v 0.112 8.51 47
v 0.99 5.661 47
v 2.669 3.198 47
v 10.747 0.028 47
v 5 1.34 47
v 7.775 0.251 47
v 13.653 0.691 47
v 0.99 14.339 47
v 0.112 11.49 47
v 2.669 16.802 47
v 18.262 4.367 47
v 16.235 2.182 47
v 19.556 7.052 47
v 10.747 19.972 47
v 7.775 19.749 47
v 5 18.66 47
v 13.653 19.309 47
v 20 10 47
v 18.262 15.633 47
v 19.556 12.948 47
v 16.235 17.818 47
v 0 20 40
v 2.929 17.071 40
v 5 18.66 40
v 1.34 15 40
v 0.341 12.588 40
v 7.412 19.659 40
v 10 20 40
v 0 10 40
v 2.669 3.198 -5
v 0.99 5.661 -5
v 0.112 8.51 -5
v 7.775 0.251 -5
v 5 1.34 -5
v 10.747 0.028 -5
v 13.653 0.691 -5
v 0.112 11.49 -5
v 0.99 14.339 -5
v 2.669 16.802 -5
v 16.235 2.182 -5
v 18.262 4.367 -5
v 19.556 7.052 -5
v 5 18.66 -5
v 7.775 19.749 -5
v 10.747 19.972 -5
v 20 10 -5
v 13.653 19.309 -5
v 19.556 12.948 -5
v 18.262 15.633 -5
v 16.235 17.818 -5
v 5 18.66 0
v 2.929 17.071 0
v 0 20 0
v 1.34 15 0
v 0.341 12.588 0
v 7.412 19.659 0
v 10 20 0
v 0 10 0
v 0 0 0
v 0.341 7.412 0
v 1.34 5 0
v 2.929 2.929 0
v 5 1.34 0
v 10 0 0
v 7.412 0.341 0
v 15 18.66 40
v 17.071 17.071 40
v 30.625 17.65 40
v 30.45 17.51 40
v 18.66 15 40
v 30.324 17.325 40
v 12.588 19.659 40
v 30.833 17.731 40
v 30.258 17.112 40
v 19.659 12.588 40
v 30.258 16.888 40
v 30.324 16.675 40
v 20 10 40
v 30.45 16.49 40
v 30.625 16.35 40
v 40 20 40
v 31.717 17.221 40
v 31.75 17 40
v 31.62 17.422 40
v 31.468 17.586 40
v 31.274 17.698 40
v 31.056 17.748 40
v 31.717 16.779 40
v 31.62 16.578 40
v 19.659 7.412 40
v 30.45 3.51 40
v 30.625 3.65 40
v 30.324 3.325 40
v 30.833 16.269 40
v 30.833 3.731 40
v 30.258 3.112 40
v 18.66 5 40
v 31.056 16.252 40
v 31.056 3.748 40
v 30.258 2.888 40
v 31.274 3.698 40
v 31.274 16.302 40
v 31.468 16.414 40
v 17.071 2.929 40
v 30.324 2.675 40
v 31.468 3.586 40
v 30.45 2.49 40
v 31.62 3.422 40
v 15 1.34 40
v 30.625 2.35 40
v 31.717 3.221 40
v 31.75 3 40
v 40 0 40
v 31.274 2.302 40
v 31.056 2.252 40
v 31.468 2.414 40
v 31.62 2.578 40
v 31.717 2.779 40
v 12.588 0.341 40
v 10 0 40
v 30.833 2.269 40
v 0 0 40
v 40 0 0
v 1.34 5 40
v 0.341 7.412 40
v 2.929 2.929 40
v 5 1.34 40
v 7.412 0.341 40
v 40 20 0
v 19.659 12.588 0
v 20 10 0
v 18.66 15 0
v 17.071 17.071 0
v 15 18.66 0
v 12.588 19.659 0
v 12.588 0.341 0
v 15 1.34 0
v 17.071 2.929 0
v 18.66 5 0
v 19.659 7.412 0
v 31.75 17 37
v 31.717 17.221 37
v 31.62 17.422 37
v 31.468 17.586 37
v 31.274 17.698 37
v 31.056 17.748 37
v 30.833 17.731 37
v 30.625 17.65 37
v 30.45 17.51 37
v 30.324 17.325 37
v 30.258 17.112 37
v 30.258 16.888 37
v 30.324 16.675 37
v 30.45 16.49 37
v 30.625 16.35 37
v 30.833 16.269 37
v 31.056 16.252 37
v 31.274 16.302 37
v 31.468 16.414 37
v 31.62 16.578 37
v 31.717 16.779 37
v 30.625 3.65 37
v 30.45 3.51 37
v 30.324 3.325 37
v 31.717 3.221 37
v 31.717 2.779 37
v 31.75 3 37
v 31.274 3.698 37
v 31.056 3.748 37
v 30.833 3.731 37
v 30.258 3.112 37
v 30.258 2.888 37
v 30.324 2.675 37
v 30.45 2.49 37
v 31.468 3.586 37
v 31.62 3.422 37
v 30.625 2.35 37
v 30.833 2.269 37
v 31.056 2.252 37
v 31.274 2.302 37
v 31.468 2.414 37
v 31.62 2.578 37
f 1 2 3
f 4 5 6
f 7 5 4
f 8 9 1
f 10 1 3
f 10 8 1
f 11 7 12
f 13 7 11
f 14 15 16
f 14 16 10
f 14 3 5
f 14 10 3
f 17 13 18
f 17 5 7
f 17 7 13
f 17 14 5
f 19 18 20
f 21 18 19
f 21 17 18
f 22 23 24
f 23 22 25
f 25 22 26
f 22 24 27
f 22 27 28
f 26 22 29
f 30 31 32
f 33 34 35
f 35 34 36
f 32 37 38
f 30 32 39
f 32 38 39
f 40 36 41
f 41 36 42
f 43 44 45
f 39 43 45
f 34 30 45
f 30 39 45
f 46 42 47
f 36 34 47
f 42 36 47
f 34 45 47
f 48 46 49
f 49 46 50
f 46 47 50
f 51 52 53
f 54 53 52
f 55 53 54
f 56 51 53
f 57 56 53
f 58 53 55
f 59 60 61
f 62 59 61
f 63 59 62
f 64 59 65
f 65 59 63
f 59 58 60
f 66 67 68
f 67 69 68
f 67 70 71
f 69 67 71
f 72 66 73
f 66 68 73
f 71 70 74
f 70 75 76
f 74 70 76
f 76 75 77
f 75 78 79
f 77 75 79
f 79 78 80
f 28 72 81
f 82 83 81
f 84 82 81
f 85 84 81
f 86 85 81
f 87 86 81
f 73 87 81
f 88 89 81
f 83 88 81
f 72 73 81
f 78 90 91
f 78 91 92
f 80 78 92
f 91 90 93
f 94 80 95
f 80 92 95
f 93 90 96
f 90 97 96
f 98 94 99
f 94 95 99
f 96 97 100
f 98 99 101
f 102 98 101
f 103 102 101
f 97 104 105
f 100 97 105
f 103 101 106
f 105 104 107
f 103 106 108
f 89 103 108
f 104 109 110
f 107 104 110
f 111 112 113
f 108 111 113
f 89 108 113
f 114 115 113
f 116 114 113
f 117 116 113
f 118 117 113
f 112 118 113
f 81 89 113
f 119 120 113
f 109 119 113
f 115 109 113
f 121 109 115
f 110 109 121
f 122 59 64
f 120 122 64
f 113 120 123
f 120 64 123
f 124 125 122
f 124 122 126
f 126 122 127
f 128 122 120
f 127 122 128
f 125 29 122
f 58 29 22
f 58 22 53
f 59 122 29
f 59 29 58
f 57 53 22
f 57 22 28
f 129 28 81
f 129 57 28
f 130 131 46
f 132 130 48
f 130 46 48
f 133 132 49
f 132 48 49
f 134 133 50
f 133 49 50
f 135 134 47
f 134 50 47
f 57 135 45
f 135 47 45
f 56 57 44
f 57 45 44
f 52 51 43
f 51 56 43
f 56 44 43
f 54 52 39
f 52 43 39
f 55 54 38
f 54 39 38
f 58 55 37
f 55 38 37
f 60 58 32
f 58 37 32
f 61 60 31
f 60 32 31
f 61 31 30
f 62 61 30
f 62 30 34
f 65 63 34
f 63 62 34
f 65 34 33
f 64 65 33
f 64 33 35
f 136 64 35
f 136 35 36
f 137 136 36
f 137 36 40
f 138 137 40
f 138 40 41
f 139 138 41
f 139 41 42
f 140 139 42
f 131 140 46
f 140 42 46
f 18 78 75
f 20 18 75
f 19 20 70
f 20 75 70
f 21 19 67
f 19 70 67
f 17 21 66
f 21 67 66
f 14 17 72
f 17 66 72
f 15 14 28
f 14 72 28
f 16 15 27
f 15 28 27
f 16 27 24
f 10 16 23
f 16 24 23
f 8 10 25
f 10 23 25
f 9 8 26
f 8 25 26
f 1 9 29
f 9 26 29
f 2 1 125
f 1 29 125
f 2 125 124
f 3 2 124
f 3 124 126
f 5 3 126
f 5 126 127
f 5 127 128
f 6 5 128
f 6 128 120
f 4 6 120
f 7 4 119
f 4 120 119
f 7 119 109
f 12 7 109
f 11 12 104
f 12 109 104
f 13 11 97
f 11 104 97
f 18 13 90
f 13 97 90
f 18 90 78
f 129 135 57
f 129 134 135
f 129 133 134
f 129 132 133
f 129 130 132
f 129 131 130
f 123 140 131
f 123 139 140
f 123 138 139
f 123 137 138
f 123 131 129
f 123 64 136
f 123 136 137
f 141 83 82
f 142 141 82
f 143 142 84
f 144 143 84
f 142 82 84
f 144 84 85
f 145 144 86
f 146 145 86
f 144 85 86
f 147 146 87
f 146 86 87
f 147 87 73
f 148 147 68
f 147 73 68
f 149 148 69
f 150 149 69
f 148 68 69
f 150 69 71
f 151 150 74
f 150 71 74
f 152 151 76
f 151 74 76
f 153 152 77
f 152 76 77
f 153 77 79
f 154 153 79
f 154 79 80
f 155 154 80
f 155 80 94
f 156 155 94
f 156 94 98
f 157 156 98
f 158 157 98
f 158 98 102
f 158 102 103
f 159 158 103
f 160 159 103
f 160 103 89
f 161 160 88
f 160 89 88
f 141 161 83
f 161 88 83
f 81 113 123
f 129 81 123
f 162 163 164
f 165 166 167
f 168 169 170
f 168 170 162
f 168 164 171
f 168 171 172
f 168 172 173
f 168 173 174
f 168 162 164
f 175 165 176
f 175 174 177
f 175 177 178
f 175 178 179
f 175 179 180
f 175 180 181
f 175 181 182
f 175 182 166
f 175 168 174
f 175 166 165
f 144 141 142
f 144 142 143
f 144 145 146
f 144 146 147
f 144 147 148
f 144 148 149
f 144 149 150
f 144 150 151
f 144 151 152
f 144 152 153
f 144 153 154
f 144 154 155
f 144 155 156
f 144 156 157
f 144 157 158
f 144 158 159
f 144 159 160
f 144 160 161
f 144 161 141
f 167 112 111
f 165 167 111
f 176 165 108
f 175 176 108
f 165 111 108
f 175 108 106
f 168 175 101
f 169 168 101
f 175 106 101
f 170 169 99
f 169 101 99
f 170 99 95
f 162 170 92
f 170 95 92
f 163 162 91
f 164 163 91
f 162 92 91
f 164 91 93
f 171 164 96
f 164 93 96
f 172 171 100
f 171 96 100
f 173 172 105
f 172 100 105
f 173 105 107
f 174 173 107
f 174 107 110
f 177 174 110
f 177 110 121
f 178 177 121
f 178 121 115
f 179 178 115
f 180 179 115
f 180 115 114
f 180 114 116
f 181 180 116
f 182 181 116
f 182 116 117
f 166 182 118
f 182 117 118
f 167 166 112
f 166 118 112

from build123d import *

# Parameters (mm, degrees)
SKETCH_1_W           = 40
SKETCH_1_H           = 40
EXTRUDE_1_DEPTH      = 20
EXTRUDE_2_DEPTH      = 7
EXTRUDE_2_DEPTH_BACK = 45
SKETCH_2_R           = 10
SKETCH_3_R           = 0.75
CUT_EXTRUDE_1_DEPTH  = 3


with BuildPart() as part:
    # 草图1 → 凸台-拉伸1 (new body)
    with BuildSketch(Plane(origin=(0, 0, 0), x_dir=(1, 0, 0), z_dir=(0, 1, 0))):
        with Locations((20, -20)):
            Rectangle(SKETCH_1_W, SKETCH_1_H)
    extrude(amount=EXTRUDE_1_DEPTH)

    # 草图2 → 凸台-拉伸2 (add, two sides: drawn at the far end of the back side and taken through both)
    with BuildSketch(Plane.XY.offset(40).offset(-EXTRUDE_2_DEPTH_BACK)):
        with Locations((10, 10)):
            Circle(SKETCH_2_R)
    extrude(amount=EXTRUDE_2_DEPTH + EXTRUDE_2_DEPTH_BACK)

    # 草图3 → 切除-拉伸1 (cut)
    with BuildSketch(Plane.XY.offset(40)):
        with Locations((31, 17)):
            Circle(SKETCH_3_R)
        with Locations((31, 3)):
            Circle(SKETCH_3_R)
    extrude(amount=-CUT_EXTRUDE_1_DEPTH, mode=Mode.SUBTRACT)


solid = part.part
